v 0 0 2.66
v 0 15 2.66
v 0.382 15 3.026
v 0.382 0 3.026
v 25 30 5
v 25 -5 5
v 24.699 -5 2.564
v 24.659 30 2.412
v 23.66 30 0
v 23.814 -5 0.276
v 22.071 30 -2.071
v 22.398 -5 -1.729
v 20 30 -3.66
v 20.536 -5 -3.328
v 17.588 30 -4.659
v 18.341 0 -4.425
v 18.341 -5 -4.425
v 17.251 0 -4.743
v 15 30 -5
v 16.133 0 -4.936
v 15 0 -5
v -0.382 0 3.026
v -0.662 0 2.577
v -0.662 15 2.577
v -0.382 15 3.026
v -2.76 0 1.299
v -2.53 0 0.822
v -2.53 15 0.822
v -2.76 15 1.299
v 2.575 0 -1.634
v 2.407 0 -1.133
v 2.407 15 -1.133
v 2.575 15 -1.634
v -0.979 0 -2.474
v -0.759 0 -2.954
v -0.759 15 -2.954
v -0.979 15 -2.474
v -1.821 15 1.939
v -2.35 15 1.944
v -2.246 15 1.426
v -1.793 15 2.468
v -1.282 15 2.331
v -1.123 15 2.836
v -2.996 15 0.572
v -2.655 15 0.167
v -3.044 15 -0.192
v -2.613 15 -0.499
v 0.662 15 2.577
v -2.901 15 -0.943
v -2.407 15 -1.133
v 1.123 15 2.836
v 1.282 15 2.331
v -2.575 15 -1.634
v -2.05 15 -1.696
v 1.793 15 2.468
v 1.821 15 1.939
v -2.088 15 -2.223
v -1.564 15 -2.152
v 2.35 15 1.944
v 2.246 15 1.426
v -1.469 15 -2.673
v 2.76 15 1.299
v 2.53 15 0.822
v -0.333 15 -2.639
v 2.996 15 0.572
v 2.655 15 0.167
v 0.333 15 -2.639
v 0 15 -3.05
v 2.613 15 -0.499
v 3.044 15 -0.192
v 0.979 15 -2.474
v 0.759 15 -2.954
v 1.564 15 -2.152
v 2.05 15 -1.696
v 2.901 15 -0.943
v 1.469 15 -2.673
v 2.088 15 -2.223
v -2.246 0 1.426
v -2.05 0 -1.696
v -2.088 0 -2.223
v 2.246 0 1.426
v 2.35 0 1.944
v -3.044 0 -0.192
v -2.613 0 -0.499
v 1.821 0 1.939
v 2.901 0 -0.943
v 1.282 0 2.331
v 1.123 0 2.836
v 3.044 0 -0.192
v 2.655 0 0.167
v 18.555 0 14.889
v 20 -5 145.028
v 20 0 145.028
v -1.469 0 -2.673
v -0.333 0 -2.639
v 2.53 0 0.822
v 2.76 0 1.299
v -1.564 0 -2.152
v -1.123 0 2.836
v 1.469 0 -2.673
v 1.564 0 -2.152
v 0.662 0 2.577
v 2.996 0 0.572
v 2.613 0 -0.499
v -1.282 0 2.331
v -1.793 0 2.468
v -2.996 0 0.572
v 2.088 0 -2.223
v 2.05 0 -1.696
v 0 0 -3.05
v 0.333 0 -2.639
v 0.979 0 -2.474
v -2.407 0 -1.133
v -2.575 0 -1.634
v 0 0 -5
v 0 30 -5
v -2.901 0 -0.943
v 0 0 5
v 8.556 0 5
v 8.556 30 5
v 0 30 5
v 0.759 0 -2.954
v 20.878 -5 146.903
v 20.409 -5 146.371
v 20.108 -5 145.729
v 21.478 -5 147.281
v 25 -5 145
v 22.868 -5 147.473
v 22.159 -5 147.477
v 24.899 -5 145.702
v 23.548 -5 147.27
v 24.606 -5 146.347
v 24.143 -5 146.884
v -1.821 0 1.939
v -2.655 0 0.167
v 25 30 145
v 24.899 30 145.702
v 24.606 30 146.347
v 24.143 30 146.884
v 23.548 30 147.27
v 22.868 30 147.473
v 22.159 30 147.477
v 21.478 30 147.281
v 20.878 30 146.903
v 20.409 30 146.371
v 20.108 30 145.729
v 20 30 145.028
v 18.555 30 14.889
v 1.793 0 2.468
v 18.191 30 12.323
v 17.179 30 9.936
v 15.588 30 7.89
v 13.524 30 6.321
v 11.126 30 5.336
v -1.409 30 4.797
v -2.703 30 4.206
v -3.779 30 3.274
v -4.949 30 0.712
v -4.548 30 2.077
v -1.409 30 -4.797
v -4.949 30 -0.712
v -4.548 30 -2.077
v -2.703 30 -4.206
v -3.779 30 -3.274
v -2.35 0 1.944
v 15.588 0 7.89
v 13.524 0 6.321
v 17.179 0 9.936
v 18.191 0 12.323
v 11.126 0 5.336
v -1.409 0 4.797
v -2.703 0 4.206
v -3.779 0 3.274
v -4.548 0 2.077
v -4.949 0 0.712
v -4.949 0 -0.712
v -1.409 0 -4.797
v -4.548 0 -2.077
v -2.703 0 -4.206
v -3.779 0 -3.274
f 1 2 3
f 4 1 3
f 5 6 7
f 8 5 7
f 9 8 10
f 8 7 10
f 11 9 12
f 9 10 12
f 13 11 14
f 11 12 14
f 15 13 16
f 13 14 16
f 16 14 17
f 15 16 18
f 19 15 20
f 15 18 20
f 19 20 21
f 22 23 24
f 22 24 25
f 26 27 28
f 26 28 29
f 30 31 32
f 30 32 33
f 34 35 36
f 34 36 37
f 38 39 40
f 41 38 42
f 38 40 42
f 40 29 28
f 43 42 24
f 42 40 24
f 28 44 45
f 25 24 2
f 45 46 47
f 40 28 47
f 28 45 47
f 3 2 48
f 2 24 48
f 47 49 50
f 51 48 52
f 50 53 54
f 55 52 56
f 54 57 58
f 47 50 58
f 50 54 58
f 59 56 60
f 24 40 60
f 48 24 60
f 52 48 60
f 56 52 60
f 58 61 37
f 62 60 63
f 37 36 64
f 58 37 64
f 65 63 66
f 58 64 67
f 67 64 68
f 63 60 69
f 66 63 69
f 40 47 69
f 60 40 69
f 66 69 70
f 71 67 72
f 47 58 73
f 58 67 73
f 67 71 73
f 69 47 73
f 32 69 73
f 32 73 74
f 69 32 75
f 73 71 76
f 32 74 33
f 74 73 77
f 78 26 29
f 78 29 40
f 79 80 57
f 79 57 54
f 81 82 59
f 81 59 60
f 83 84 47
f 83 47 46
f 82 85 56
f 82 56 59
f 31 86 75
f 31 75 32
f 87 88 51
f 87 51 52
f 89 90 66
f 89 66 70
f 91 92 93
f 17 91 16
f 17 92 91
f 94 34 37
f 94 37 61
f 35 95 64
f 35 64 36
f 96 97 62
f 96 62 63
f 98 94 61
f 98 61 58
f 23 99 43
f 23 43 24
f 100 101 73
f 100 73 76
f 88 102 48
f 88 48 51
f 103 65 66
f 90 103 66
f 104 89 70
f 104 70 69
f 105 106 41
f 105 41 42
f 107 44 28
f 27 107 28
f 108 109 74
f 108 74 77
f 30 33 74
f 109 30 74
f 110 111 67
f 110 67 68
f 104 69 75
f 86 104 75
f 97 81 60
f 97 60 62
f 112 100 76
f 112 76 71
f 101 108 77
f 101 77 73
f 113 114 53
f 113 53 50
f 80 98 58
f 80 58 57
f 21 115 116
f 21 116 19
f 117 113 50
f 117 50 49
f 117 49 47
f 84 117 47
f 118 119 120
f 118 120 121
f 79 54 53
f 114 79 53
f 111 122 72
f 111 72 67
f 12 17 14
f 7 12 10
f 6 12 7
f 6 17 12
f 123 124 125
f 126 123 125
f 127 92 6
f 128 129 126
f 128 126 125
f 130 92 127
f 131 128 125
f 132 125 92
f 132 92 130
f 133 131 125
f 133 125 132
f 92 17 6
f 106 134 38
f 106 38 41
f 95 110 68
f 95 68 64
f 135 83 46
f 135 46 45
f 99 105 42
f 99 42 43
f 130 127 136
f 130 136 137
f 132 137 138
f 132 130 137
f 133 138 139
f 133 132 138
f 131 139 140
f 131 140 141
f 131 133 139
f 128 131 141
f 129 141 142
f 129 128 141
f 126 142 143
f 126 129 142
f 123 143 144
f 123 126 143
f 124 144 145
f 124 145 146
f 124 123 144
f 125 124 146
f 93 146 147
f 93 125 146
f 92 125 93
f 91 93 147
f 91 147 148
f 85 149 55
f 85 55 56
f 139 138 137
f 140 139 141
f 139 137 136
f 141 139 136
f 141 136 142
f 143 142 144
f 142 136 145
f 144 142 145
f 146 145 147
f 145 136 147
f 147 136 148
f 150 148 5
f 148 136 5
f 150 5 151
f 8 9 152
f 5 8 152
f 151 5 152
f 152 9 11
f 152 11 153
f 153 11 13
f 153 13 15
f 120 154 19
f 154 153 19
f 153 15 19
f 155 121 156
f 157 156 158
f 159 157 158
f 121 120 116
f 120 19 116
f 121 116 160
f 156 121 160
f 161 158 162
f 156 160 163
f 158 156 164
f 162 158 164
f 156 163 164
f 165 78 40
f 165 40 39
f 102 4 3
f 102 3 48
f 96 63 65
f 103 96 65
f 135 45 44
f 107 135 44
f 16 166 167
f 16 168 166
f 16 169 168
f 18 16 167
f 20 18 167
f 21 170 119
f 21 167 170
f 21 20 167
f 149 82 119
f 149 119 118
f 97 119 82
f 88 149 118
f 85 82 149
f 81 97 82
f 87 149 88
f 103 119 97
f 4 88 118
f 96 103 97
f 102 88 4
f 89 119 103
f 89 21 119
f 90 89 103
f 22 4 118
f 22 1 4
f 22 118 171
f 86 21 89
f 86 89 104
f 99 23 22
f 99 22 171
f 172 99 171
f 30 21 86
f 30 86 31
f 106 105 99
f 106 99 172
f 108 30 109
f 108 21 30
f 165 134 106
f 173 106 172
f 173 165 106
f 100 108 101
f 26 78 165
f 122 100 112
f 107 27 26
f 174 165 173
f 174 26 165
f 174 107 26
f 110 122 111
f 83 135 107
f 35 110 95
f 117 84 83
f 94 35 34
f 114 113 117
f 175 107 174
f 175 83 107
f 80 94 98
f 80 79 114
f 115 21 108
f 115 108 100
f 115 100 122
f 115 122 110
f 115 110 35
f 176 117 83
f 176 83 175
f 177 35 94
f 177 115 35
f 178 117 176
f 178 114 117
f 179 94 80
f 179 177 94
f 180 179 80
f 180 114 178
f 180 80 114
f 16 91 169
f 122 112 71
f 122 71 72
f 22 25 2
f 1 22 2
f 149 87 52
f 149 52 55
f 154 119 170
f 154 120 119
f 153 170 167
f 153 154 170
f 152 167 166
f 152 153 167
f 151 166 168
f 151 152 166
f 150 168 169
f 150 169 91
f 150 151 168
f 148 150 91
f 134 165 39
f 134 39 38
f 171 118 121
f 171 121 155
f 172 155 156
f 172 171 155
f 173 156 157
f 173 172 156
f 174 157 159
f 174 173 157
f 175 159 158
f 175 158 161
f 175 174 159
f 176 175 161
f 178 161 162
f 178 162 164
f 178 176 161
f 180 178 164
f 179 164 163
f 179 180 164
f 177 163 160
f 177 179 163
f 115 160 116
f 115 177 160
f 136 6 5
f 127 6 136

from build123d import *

# Parameters (mm, degrees)
BOSS_EXTRUDE2_DEPTH = 30
FILLET1_R           = 10
FILLET2_R           = 10
SKETCH2_R           = 3.747343823
BOSS_EXTRUDE3_DEPTH = 15
BOSS_EXTRUDE4_START = 5
BOSS_EXTRUDE4_DEPTH = 5
FILLET3_R           = 10


with BuildPart() as part:
    # Sketch1 → Boss-Extrude2 (new body)
    with BuildSketch(Plane(origin=(0, 0, 0), x_dir=(1, 0, 0), z_dir=(0, 1, 0))):
        with BuildLine():
            Line((0, 5), (25, 5))
            Line((25, 5), (25, -145))
            ThreePointArc((25, -145), (22.513876781, -147.499961487), (20.000154052, -145.027753135))
            Line((20.000154052, -145.027753135), (18.445574612, -5))
            Line((18.445574612, -5), (0, -5))
            ThreePointArc((0, -5), (-5, 0), (0, 5))
        make_face()
        Polygon((0.333439775, 2.639447604), (0, 3.05), (-0.333439775, 2.639447604), (-0.758504156, 2.954178641), (-0.979368078, 2.473601404), (-1.469348706, 2.672735374), (-1.563759083, 2.15232973), (-2.087868673, 2.223354314), (-2.049893354, 1.695819264), (-2.575200173, 1.634271725), (-2.407225286, 1.132754236), (-2.900722375, 0.942501833), (-2.6133024, 0.498514094), (-3.043981522, 0.191511085), (-2.655176114, -0.167049522), (-2.995976115, -0.571513009), (-2.530215347, -0.822116802), (-2.75972251, -1.298626839), (-2.246271844, -1.42552746), (-2.35006539, -1.944143169), (-1.821186821, -1.939366985), (-1.792745019, -2.467501833), (-1.281669931, -2.33134895), (-1.122779886, -2.835818282), (-0.661621006, -2.576843686), (-0.382266362, -3.025949839), (0, -2.660425857), (0.382266362, -3.025949839), (0.661621006, -2.576843686), (1.122779886, -2.835818282), (1.281669931, -2.33134895), (1.792745019, -2.467501833), (1.821186821, -1.939366985), (2.35006539, -1.944143169), (2.246271844, -1.42552746), (2.75972251, -1.298626839), (2.530215347, -0.822116802), (2.995976115, -0.571513009), (2.655176114, -0.167049522), (3.043981522, 0.191511085), (2.6133024, 0.498514094), (2.900722375, 0.942501833), (2.407225286, 1.132754236), (2.575200173, 1.634271725), (2.049893354, 1.695819264), (2.087868673, 2.223354314), (1.563759083, 2.15232973), (1.469348706, 2.672735374), (0.979368078, 2.473601404), (0.758504156, 2.954178641), align=None, mode=Mode.SUBTRACT)
    extrude(amount=BOSS_EXTRUDE2_DEPTH)

    # Fillet1
    fillet1_edges = [part.edges().sort_by_distance(p)[0] for p in [
        (18.445574612, 15, 5),
    ]]
    fillet(fillet1_edges, radius=FILLET1_R)

    # Fillet2
    fillet2_edges = [part.edges().sort_by_distance(p)[0] for p in [
        (25, 15, -5),
    ]]
    fillet(fillet2_edges, radius=FILLET2_R)

    # Sketch2 → Boss-Extrude3 (add)
    with BuildSketch(Plane(origin=(0, 30, 0), x_dir=(1, 0, 0), z_dir=(0, 1, 0))):
        Circle(SKETCH2_R)
    extrude(amount=-BOSS_EXTRUDE3_DEPTH)

    # Sketch3 → Boss-Extrude4 (add)
    with BuildSketch(Plane.XZ.offset(BOSS_EXTRUDE4_START)):
        with BuildLine():
            Line((20.000154052, 145.027753135), (18.34093441, -4.425399581))
            Line((18.34093441, -4.425399581), (25, -4.425399581))
            Line((25, -4.425399581), (25, 145))
            ThreePointArc((25, 145), (22.513876781, 147.499961487), (20.000154052, 145.027753135))
        make_face()
    extrude(amount=-BOSS_EXTRUDE4_DEPTH)

    # Fillet3
    # the kernel refuses this fillet: 10 mm, written as the material it takes off along each edge
    with BuildSketch(Plane(origin=(25, -28.563498953, -4.425399581), x_dir=(0, 0, 1), z_dir=(0, 1, 0))) as fillet3_piece_1:
        with BuildLine():
            CenterArc((9.425399581, -10), FILLET3_R, 90, 70.482580004)
            Line((0, -6.65906559), (-0.188507992, -6.592246902))
            ThreePointArc((-0.188507992, -6.592246902), (-0.2, -3.329532795), (-0.2, 0))
            Line((-0.2, 0), (0, 0.2))
            Line((0, 0.2), (9.425399581, 0.2))
            Line((9.425399581, 0.2), (9.425399581, 0))
        make_face()
    extrude(amount=52.126997906, mode=Mode.SUBTRACT)


solid = part.part
